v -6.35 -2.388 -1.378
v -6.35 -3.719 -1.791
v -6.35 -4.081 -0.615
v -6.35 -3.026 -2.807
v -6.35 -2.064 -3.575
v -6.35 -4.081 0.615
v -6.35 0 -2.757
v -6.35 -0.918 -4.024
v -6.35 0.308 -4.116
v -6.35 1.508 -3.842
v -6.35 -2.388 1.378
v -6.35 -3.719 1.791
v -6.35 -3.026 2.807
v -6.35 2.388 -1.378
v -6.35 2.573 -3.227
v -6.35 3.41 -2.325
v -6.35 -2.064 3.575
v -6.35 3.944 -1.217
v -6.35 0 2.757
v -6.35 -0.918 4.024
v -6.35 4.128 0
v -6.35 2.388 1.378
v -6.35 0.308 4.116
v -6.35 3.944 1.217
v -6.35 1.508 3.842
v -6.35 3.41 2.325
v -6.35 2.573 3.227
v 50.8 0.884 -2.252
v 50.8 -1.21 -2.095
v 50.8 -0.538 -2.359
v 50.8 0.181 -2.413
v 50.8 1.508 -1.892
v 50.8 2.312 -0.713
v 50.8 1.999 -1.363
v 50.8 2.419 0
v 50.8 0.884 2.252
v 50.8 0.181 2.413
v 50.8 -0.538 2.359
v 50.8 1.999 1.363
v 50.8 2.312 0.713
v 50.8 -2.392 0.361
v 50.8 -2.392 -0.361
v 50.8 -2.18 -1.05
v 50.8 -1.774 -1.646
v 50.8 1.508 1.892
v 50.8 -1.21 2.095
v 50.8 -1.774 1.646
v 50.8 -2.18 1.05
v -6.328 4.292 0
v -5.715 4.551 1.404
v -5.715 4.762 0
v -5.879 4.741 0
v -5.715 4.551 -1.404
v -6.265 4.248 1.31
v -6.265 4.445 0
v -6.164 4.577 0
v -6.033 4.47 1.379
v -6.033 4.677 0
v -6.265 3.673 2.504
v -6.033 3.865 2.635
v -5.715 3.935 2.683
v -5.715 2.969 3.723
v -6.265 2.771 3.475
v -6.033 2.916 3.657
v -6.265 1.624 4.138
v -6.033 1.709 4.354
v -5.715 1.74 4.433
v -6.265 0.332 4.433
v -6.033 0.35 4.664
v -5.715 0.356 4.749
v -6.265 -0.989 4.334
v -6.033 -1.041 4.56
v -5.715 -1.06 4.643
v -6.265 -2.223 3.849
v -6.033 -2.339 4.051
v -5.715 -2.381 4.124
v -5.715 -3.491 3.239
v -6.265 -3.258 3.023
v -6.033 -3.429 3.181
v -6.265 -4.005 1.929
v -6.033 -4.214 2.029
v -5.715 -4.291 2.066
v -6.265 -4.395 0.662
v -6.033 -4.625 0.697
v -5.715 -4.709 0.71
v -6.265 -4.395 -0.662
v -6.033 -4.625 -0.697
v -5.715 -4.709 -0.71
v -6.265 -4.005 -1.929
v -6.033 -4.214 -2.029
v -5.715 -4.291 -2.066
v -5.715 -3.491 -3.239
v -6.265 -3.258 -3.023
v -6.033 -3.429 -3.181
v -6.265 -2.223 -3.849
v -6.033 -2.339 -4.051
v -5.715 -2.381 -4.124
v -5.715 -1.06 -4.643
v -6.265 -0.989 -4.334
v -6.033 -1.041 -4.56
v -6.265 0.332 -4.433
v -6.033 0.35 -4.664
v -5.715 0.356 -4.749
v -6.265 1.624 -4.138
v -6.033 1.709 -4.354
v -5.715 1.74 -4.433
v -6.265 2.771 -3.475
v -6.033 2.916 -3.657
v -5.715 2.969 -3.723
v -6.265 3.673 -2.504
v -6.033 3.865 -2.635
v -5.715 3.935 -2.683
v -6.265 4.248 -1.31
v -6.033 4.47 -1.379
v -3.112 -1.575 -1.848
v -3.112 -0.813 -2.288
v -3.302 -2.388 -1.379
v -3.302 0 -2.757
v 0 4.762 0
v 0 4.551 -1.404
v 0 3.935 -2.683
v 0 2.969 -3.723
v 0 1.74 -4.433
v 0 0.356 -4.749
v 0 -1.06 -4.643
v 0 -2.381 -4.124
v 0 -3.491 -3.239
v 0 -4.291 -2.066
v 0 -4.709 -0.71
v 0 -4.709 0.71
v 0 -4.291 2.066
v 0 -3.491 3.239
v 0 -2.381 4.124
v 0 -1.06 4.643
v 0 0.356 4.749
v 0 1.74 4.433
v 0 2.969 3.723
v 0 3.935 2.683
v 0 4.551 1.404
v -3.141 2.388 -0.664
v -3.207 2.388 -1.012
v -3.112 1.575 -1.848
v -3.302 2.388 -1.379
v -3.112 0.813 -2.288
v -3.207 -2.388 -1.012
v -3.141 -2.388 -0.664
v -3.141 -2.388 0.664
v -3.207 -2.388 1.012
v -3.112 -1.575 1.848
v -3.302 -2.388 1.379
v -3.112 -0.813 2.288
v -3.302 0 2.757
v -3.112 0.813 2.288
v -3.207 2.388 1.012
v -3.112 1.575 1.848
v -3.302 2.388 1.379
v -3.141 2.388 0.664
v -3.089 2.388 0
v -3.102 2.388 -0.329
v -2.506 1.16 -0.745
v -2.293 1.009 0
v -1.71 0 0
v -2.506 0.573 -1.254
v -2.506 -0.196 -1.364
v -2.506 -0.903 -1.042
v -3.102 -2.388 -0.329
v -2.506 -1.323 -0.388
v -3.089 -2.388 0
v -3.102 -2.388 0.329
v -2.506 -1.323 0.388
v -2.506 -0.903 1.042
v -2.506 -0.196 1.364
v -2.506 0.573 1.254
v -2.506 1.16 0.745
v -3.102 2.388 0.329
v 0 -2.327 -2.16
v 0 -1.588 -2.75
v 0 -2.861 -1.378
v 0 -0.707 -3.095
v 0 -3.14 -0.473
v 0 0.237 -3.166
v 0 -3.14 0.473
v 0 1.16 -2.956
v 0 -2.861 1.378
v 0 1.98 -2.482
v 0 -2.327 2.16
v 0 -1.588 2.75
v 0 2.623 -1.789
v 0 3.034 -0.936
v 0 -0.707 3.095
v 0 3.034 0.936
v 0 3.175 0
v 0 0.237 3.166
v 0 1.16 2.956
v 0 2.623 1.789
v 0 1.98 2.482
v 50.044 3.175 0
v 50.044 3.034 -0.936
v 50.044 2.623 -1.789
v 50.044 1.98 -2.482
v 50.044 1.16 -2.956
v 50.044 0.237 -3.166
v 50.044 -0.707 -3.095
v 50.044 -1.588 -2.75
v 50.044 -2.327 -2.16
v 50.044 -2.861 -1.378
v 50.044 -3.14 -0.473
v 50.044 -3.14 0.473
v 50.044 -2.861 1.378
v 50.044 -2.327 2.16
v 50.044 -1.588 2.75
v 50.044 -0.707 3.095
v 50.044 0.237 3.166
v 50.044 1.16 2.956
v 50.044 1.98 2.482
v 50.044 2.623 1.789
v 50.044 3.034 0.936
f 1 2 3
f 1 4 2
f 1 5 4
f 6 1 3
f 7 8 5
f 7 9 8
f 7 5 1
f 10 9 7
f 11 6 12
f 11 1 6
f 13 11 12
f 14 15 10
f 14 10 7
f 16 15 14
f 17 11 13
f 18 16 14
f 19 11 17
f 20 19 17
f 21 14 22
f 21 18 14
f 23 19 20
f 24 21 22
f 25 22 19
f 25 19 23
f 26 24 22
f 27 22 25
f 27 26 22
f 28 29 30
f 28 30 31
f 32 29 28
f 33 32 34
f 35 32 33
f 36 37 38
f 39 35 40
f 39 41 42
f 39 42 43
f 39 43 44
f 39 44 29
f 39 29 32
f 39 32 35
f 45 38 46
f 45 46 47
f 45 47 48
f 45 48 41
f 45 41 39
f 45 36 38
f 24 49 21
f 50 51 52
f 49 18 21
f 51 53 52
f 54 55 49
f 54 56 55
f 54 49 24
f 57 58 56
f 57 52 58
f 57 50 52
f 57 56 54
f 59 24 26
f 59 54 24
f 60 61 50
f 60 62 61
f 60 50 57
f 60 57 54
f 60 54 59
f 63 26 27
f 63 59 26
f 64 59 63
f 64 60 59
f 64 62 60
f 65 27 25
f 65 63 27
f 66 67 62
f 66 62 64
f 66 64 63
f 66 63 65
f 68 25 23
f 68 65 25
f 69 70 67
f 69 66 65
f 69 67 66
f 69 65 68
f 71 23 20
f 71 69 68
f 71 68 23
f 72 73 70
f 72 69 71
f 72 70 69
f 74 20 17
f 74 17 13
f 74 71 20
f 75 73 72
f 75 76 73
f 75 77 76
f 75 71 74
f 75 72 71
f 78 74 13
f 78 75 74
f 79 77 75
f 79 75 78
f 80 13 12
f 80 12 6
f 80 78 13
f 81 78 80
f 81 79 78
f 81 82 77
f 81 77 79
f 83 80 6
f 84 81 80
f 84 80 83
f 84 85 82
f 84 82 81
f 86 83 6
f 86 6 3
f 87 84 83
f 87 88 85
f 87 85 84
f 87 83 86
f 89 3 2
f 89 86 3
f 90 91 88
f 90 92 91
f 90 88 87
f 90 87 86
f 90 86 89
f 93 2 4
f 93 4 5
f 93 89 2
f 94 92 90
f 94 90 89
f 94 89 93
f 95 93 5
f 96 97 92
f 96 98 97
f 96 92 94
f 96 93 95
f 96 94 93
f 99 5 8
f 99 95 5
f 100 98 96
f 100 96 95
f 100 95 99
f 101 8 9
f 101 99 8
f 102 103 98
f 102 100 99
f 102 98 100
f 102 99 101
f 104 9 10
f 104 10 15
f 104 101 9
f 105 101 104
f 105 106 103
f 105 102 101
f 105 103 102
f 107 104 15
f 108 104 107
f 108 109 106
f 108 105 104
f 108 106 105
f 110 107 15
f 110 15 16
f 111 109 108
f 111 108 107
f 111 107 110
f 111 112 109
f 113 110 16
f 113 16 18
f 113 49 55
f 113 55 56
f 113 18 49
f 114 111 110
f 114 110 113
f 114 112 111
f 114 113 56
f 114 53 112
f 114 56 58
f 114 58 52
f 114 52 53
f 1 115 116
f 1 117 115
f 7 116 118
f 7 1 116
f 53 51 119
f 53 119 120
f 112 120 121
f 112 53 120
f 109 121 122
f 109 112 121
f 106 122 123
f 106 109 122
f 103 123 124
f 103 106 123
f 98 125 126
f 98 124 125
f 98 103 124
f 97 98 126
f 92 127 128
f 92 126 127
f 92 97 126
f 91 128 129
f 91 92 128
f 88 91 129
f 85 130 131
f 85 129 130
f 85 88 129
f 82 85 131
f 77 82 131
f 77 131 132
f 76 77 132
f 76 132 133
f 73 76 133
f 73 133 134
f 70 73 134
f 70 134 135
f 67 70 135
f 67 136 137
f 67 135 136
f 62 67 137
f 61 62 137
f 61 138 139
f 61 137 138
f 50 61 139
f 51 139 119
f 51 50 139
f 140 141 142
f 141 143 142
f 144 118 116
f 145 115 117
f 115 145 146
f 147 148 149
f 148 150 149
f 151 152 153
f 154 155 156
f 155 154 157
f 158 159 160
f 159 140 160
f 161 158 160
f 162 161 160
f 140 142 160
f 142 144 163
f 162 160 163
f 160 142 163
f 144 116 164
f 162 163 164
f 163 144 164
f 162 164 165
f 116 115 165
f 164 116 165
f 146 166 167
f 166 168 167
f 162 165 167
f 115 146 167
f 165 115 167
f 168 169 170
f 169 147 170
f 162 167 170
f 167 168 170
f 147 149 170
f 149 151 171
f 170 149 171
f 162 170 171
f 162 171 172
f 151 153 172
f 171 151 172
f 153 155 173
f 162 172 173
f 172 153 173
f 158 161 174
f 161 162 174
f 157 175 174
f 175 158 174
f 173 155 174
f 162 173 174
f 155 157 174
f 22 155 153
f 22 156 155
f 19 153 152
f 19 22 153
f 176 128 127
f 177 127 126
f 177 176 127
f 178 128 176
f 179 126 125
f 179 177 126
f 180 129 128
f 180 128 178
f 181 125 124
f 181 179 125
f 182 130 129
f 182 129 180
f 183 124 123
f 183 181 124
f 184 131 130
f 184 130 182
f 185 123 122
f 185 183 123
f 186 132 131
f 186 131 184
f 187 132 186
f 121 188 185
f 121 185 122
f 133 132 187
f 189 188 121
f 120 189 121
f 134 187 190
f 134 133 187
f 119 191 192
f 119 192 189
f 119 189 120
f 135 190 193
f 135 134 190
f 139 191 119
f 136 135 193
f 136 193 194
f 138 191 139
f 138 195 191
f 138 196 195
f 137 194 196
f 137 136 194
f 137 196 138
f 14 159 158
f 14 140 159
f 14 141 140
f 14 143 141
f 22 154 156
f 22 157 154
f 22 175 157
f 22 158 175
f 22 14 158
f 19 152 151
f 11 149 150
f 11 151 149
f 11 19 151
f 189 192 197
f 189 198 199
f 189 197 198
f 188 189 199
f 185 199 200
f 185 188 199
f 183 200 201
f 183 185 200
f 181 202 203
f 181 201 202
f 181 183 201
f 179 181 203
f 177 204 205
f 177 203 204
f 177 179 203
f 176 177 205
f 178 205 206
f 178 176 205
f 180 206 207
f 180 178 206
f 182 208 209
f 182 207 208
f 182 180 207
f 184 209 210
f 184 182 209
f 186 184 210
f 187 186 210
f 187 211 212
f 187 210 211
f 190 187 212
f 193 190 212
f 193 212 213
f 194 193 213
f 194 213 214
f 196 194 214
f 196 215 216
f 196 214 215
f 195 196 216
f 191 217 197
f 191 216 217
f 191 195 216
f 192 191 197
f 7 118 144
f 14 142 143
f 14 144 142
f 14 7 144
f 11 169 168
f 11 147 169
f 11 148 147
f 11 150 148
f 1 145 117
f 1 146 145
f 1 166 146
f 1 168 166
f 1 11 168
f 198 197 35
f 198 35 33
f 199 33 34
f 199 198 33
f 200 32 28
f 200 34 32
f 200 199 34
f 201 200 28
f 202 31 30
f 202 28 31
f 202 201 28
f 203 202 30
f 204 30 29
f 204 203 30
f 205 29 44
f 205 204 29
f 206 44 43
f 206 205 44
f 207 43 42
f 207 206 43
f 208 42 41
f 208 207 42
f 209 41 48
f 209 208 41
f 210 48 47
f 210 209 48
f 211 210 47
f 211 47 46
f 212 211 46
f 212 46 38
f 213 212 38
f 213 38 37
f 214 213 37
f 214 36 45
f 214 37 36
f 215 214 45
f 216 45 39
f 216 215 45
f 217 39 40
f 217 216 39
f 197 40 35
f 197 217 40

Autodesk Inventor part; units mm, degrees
ref_plane "YZ Plane" through (0, 0, 0) normal (1, 0, 0) x (0, 1, 0)
ref_plane "XZ Plane" through (0, 0, 0) normal (0, 1, 0) x (-1, 0, 0)
sketch "Sketch1" plane through (0, 0, 0) normal (0, 0, 1) x (1, 0, 0)
  line L0 (-1.7103, 0) -> (50.8, 0)
  line L1 (50.8, 0) -> (50.8, 3.175)
  line L2 (50.8, 3.175) -> (19.05, 3.175)
  line L3 (19.05, 3.175) -> (15.8749, 3.175)
  line L4 (15.8749, 3.175) -> (0, 3.175)
  line L5 (0, 3.175) -> (0, 4.7625)
  line L6 (0, 4.7625) -> (-6.35, 4.7625)
  line L7 (-6.35, 4.7625) -> (-6.35, 2.757)
  line L8 (-6.35, 2.757) -> (-3.302, 2.757)
  line L9 (-3.302, 2.757) -> (-1.7103, 0)
  line L10 (-16.51, 0) -> (54.61, 0) projected
  line L11 (0, -0.9525) -> (0, 5.715) projected
  line L12 (19.05, 3.175) -> (0, 3.175) construction
  dimension "d1" = 31.75
  dimension "d2" = 3.1751
  dimension "d3" = 6.35
  dimension "d4" = 3.048
  dimension "d5" = 60
  dimension "d6" = 6.35
  dimension "d7" = 6.35
  dimension "d8" = 5.5139
  dimension "d9" = 9.525
  dimension "d26" = 50.8
revolve "Body" add sketch "Sketch1" angle 360 about axis through (-1.7103, 0, 0) along (1, 0, 0)
sketch "Sketch2" plane through (-6.35, 0, 0) normal (-1, 0, 0) x (0, 0, 1)
  circle A0 centre (0, 0) radius 2.757 projected
  line L0 (0, -6.6675) -> (0, 6.6675) projected
  line L1 (-6.6675, 0) -> (6.6675, 0) projected
  line L2 (2.757, 0) -> (1.3785, -2.3876)
  line L3 (1.3785, -2.3876) -> (-1.3785, -2.3876)
  line L4 (-1.3785, -2.3876) -> (-2.757, 0)
  line L5 (-2.757, 0) -> (-1.3785, 2.3876)
  line L6 (-1.3785, 2.3876) -> (1.3785, 2.3876)
  line L7 (1.3785, 2.3876) -> (2.757, 0)
extrude "Slot" add sketch "Sketch2" against normal up to next contours L7 A0 | A0 L2 | L6 L0 A0 | A0 L0 L3 | L0 L6 A0 | A0 L3 L0 | L4 A0 | A0 L5
fillet "Fillet1" radius 0.635 1 edges at (-6.35, -4.7625, 0)
thread "Thread" size "1/4-20 UNC" class "2A" standard "ANSI Unified Screw Threads" length 31.75
chamfer "Chamfer1" distance 0.7556 distance2 0.7556 1 edges at (50.8, -3.175, 0) measured on face at (50.8, -0.8017, -1.6073)
ref_plane "Work Plane1" through (29, 0, 0) normal (0, -1, 0) x (1, 0, 0)
equation "\"d1\" = GEL"
equation "\"d3\" = KOH"
equation "\"d4\" = INTI"
equation "\"d6\" = GD"
equation "\"d7\" = BDM"
equation "\"d8\" = 1.1547 * SW"
equation "\"d9\" = KOD"
equation "\"d26\" = NLG"
equation "\"d17\" = RR"
equation "\"d13\" = GEL"
equation "\"d15\" = -0.5 * SPD + 0.5 * GD"
equation "\"d16\" = GUL"
equation "\"GD\" = 6.35"
equation "\"NLG\" = 50.8"
equation "\"GEL\" = 31.75"
equation "\"KOD\" = 9.525"
equation "\"KOH\" = 6.35"
equation "\"INTI\" = 3.048"
equation "\"GAL\" = 3.175"
equation "\"GUL\" = 0.75565"
equation "\"BDM\" = 6.35"
equation "\"SW\" = 4.7752"
equation "\"RR\" = 0.635"
equation "\"SPD\" = 4.8387"
equation "\"R\" = 0.1778"
equation "\"PHH\" = 0.2032"
equation "\"GD1\" = SPD"
equation "\"THREADDIA\" = 6.35"
equation "\"FAWI\" = 45deg"
equation "\"KOH1\" = 5.715"
equation "\"NND\" = 6.35"
equation "\"TOA\" = 30deg"
equation "\"E0\" = 1.155 * SW"
properties part number "am-1058" material "Steel"
